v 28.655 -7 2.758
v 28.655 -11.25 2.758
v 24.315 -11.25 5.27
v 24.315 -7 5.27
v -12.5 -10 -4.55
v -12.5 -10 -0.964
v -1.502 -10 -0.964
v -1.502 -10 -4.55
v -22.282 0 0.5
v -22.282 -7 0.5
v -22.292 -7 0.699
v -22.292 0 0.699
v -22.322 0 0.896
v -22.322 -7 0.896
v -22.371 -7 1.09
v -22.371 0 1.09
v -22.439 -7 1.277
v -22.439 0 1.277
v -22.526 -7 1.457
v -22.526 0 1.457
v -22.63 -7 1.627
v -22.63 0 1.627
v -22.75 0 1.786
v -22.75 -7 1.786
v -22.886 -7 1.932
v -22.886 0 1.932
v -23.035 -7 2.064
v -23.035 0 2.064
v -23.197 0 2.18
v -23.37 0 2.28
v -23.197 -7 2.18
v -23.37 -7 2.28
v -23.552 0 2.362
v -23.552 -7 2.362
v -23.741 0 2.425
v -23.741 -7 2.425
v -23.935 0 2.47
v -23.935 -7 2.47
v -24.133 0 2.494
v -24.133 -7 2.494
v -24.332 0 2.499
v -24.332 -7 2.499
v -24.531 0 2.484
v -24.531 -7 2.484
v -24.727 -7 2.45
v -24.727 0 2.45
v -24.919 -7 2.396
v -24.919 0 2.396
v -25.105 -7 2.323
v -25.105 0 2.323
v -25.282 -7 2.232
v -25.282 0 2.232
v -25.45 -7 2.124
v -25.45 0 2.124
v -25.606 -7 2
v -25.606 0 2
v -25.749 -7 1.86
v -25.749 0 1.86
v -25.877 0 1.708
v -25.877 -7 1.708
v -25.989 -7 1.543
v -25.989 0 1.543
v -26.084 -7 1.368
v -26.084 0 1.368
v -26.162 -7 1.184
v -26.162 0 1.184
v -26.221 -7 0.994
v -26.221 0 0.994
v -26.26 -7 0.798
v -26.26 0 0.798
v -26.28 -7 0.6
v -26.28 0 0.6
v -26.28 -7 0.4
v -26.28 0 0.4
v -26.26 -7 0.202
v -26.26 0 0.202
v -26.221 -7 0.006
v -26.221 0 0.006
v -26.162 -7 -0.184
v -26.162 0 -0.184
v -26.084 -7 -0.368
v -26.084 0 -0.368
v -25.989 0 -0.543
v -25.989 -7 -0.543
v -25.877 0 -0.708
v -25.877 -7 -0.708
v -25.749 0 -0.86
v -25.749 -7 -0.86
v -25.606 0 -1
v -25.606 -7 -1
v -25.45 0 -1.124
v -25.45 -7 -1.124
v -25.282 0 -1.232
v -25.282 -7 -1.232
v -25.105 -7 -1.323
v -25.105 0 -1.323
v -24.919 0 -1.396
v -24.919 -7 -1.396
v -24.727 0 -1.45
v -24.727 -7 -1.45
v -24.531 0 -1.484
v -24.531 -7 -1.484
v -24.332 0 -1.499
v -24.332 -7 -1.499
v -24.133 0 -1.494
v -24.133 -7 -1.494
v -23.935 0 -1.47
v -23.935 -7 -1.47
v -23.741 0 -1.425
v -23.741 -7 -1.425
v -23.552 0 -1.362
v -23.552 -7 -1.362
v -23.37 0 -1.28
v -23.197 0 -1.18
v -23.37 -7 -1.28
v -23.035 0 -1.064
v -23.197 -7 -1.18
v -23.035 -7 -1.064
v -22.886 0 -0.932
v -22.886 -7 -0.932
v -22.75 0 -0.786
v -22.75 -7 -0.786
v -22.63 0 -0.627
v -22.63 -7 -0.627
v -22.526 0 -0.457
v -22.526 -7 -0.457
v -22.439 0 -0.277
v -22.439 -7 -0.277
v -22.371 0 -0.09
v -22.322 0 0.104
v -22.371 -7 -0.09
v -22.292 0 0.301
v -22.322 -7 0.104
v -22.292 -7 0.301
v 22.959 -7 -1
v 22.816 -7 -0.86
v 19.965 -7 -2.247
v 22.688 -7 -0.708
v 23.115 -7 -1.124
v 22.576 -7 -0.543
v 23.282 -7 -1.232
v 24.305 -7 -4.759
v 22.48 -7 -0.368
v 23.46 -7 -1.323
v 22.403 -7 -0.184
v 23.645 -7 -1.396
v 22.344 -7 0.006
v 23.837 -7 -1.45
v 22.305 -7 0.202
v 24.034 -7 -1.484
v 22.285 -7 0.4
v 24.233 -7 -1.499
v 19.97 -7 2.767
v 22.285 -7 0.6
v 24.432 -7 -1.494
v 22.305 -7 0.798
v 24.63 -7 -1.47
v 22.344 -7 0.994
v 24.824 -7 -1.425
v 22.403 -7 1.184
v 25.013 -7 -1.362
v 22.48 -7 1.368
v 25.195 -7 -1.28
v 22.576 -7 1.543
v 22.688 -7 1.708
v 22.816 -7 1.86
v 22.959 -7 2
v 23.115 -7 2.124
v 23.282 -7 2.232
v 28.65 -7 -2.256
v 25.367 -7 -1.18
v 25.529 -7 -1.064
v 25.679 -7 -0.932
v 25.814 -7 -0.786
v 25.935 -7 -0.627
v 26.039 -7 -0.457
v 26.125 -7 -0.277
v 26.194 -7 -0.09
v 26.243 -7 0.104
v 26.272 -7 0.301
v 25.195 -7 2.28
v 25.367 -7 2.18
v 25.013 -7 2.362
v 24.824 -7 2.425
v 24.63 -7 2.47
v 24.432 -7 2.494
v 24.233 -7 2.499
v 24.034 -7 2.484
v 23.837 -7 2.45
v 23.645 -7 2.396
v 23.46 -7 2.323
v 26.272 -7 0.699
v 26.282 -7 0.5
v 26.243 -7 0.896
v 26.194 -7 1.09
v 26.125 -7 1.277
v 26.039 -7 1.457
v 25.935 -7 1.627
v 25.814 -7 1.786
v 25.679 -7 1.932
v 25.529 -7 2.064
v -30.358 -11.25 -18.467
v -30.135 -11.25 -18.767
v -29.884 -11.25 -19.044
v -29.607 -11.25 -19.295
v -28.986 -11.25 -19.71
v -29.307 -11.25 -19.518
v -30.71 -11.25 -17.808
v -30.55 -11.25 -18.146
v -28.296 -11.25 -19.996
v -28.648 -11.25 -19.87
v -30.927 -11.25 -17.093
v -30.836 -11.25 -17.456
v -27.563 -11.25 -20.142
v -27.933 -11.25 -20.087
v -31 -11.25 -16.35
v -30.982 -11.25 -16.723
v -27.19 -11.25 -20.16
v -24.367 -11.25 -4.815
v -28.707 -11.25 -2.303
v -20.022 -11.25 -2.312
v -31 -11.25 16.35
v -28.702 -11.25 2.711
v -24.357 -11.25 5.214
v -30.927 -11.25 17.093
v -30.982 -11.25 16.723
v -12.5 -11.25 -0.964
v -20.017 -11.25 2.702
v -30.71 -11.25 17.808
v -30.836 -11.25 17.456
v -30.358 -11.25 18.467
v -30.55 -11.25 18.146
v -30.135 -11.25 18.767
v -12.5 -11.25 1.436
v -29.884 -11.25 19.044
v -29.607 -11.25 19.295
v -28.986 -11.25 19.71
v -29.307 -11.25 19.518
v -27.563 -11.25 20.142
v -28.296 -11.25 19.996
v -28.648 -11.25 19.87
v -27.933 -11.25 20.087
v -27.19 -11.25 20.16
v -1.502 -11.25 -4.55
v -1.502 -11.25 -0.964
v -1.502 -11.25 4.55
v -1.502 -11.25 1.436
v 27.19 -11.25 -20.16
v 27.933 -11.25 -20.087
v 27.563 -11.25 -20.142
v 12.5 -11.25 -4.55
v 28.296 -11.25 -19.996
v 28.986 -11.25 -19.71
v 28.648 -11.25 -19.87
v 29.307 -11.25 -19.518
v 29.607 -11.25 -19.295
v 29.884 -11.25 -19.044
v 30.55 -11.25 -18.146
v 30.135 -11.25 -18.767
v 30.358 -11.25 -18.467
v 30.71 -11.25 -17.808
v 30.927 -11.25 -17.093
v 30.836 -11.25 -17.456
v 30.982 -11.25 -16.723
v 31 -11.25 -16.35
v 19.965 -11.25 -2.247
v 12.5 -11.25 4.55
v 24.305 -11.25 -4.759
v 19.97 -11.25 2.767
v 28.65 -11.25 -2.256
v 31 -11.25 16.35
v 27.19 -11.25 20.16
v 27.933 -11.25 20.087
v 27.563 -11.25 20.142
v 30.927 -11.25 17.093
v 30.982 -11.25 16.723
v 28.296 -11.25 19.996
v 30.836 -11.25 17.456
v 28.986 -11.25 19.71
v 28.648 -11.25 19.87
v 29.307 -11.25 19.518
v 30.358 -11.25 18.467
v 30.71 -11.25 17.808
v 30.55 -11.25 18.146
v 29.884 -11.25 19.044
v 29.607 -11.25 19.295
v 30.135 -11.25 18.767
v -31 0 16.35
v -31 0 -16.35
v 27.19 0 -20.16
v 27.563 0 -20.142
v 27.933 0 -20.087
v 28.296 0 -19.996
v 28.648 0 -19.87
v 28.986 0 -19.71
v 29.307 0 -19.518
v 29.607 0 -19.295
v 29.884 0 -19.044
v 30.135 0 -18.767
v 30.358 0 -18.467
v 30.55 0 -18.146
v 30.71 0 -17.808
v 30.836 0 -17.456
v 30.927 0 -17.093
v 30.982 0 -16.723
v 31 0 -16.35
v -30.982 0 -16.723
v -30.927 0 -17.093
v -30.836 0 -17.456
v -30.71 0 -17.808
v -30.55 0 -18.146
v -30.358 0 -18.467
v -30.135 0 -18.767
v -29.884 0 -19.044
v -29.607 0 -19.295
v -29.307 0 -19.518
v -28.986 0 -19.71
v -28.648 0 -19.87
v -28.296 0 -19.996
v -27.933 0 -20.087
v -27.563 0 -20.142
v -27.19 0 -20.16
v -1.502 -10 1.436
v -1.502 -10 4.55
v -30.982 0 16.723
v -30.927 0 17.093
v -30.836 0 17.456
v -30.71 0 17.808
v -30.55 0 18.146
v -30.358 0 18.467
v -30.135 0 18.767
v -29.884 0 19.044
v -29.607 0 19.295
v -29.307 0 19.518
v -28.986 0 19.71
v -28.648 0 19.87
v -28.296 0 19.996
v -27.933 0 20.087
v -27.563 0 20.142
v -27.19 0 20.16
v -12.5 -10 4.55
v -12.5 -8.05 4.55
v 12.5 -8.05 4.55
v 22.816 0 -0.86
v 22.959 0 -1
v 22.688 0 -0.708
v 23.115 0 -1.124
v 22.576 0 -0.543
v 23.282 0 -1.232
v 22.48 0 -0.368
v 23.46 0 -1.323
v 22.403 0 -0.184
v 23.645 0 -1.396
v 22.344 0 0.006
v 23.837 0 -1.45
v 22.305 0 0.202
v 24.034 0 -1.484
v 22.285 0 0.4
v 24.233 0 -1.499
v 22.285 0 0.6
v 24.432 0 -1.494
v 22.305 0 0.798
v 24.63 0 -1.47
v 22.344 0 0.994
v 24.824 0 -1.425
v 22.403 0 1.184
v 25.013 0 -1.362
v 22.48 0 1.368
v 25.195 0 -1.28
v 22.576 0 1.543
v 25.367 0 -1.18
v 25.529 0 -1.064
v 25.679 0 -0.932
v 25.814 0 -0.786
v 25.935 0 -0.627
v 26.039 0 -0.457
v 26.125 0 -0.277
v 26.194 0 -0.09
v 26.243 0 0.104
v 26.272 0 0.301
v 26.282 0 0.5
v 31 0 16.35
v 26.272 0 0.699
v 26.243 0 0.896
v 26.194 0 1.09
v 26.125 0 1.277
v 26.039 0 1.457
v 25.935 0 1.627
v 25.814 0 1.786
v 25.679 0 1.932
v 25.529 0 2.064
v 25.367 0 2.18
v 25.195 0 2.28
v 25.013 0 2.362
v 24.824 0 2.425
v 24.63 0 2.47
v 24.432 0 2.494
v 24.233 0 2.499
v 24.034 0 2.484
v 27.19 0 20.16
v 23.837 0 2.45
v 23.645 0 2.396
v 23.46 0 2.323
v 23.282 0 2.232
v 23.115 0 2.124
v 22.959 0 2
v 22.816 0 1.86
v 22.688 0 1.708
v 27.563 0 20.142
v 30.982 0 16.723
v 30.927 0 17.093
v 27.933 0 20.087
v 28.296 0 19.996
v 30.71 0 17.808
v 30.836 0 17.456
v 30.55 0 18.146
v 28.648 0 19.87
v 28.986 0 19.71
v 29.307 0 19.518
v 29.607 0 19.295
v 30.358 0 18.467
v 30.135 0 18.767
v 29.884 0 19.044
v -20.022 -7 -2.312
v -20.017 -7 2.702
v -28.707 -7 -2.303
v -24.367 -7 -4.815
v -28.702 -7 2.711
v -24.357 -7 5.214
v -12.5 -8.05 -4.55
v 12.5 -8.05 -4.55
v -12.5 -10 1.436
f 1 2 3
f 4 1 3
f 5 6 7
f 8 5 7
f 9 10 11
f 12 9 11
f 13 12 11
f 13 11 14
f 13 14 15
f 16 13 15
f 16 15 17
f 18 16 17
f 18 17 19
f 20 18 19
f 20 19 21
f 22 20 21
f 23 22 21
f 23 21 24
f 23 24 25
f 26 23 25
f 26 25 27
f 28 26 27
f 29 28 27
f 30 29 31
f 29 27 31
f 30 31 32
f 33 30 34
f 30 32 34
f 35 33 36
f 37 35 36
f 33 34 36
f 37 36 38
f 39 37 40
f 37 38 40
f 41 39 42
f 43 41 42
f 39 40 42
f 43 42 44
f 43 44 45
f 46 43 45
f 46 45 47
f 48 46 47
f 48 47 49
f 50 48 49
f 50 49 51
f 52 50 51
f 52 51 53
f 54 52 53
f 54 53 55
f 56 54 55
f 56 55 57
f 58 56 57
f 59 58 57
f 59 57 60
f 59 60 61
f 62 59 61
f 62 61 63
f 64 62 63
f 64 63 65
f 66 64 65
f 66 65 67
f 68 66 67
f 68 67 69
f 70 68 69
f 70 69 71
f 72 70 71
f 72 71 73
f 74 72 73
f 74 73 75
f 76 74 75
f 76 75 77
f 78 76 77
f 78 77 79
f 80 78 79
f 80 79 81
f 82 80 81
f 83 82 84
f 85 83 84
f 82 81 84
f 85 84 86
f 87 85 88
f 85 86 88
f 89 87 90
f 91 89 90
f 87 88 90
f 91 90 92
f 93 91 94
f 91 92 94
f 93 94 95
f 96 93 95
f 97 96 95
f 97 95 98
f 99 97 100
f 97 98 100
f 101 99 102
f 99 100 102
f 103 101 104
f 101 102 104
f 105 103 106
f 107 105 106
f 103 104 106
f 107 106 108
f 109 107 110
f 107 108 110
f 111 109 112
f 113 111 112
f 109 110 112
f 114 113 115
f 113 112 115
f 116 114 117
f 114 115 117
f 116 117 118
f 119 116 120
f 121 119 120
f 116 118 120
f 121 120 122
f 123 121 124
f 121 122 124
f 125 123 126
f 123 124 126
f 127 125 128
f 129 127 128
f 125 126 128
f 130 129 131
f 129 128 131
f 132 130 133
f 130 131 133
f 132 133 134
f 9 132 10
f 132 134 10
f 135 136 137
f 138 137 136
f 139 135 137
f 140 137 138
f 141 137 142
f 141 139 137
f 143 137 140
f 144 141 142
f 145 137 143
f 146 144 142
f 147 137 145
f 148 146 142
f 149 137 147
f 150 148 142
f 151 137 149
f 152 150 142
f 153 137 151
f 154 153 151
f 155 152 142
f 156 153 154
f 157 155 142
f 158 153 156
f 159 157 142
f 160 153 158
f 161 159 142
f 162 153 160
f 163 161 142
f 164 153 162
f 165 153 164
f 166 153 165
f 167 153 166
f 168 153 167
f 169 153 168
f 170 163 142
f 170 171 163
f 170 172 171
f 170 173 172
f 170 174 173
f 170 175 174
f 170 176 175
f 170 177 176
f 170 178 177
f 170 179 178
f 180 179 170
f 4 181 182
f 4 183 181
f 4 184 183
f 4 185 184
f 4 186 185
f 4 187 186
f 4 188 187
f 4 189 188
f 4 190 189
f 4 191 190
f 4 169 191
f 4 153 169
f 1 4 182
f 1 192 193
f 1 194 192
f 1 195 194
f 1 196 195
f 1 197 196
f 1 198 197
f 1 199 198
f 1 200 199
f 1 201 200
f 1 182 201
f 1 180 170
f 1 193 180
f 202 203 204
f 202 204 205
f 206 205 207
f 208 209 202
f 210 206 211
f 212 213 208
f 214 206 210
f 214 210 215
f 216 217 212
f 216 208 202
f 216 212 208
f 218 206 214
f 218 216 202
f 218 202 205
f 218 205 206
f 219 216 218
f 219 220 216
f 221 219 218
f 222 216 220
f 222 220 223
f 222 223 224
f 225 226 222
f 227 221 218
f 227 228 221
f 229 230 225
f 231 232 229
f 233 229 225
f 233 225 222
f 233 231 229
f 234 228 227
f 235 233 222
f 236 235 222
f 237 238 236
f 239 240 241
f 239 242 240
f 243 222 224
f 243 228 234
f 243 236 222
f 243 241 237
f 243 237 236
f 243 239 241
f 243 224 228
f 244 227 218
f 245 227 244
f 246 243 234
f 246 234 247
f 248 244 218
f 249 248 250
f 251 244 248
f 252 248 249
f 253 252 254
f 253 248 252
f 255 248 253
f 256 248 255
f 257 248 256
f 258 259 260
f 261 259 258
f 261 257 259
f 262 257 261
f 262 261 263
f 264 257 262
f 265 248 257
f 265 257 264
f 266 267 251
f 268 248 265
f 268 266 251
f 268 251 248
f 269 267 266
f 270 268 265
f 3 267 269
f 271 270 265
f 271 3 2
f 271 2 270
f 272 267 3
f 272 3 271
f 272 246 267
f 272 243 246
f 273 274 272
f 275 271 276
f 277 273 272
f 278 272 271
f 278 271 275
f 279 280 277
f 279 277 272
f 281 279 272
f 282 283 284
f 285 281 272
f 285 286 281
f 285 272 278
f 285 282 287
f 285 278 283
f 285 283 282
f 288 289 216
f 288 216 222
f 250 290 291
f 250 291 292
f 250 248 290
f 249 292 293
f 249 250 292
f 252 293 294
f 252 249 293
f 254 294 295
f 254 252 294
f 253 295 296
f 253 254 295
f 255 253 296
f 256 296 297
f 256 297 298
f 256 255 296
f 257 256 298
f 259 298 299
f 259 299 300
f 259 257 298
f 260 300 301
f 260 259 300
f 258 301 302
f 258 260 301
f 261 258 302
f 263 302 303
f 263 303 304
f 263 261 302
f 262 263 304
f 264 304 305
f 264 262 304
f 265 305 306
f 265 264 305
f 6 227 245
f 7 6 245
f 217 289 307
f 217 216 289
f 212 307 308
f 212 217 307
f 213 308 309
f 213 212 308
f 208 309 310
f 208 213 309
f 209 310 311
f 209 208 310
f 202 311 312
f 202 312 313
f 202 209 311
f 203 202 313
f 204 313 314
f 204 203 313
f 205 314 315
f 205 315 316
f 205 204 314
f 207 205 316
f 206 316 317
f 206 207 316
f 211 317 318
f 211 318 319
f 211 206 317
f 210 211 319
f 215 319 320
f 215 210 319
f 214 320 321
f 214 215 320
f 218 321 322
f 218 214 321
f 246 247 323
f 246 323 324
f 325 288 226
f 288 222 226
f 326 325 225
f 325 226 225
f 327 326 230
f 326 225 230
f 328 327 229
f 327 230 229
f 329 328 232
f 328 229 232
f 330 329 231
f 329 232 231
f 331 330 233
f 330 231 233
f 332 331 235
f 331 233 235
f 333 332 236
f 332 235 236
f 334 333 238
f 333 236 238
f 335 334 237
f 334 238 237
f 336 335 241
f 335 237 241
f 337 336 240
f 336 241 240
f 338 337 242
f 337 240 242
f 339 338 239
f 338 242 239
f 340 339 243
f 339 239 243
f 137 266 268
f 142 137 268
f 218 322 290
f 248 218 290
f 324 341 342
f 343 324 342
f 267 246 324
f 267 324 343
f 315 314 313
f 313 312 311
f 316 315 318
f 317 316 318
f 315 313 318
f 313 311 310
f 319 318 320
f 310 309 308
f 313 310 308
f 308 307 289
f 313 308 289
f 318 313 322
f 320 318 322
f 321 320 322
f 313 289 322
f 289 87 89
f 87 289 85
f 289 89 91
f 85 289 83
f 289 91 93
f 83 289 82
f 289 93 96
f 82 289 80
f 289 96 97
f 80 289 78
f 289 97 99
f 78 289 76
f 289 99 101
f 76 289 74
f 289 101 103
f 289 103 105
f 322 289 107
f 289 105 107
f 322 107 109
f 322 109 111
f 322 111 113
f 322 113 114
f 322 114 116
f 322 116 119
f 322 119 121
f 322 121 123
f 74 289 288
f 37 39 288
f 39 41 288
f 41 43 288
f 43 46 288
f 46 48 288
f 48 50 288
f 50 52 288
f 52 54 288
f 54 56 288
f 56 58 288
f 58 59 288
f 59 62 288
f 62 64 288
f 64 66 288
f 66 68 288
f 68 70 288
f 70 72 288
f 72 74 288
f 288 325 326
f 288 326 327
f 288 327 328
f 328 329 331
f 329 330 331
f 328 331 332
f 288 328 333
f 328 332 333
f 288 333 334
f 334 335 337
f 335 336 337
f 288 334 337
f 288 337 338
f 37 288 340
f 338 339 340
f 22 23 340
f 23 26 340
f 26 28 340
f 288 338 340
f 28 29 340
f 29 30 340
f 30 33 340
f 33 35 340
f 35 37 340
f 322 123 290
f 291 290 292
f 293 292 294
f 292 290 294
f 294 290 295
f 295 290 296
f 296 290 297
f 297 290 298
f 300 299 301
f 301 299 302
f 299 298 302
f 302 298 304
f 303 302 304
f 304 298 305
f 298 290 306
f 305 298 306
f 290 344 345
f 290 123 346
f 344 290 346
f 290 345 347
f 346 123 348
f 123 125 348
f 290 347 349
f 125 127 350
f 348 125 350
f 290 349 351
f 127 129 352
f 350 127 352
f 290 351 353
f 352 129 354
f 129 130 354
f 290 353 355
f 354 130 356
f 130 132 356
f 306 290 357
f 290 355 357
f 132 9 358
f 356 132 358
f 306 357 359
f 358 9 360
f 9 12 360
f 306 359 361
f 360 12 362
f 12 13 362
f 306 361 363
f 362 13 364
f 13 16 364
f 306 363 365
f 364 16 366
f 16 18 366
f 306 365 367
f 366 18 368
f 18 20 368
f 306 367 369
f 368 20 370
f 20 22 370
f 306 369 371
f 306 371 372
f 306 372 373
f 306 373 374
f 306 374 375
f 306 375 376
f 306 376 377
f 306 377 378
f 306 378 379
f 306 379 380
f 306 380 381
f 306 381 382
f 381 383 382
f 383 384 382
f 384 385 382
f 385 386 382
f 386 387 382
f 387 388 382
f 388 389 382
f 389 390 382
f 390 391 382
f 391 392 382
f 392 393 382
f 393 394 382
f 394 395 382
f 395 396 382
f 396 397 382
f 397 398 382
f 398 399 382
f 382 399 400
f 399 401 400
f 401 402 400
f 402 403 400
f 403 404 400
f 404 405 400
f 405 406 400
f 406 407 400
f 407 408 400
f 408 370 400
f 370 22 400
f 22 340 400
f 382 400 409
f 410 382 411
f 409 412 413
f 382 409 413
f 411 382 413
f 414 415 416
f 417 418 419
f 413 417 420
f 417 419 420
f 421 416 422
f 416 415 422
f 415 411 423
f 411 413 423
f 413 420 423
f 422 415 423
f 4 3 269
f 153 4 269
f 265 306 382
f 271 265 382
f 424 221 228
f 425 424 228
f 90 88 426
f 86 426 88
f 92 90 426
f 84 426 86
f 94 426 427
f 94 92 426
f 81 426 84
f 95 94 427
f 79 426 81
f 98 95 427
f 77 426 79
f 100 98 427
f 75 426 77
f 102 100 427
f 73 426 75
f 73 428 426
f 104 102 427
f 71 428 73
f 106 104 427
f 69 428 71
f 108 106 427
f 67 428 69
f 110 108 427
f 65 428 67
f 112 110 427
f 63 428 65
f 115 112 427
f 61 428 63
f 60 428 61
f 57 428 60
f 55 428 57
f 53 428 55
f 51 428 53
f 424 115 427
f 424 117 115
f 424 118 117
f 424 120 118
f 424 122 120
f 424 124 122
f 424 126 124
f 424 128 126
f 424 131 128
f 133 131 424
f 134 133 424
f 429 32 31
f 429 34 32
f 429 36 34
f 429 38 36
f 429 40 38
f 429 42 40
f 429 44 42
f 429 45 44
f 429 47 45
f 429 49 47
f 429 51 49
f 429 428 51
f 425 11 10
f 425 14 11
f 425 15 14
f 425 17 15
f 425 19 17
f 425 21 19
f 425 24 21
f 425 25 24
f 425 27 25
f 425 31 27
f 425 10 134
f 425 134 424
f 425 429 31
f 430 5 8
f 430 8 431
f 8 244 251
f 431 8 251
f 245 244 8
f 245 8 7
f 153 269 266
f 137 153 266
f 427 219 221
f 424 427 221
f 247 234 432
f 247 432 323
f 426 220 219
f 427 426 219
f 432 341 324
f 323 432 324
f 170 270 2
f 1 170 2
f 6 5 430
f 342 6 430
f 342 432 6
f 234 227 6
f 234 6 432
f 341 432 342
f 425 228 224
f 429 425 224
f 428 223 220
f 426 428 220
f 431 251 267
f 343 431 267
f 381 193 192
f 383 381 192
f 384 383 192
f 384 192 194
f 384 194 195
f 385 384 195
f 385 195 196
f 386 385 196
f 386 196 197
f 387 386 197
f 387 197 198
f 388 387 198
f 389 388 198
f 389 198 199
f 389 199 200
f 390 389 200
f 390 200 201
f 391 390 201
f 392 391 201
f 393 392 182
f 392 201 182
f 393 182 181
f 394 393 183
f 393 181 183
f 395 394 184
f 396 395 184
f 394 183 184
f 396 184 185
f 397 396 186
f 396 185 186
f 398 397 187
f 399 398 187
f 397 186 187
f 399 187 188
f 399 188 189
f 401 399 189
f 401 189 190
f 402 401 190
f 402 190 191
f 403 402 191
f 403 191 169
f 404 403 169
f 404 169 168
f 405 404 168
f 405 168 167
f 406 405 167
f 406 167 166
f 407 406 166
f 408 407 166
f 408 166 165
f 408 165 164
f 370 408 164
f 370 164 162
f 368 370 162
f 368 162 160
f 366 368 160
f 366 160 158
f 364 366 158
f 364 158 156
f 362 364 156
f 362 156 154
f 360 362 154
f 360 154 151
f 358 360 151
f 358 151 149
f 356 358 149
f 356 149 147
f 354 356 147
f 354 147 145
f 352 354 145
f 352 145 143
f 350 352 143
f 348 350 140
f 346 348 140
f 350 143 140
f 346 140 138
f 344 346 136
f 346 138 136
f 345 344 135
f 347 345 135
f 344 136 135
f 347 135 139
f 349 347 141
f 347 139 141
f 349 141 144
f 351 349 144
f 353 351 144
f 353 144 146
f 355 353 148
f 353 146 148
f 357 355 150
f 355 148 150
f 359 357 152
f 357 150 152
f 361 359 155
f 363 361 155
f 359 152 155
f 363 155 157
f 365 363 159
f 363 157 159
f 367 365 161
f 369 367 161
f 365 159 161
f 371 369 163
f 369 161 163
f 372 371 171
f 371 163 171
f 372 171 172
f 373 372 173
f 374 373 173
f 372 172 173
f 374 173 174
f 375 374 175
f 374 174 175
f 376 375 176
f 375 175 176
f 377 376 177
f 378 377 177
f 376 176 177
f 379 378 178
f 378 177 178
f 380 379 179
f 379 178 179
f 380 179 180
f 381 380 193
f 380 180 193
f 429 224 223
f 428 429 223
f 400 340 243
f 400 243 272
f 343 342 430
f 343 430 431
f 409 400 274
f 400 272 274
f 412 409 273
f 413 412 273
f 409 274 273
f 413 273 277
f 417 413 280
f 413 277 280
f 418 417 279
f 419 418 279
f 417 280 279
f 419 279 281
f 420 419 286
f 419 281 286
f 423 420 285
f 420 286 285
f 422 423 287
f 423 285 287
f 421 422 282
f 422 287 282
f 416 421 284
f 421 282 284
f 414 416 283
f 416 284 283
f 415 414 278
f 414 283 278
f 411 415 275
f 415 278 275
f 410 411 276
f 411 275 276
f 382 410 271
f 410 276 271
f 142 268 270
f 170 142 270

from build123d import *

# Parameters (mm, degrees)
F0_W      = 62
F0_H      = 40.32
F1_DEPTH  = 11.25
F2_W      = 25
F2_H      = 9.1
F3_DEPTH  = 3.2
F4_W      = 10.9982
F4_H      = 3.1144623497
F4_H_2    = 3.5855376503
F5_DEPTH  = 1.25
F6_R      = 3.81
F7_R      = 2
F8_DEPTH  = 15.24
F10_DEPTH = 4.25


with BuildPart() as f1:
    # F0 (on Front) → F1 (new body)
    with BuildSketch(Plane.XZ):
        Rectangle(F0_W, F0_H)
    extrude(amount=F1_DEPTH)

    # F2 (on face) → F3 (cut)
    with BuildSketch(Plane.XZ.offset(11.25)):
        Rectangle(F2_W, F2_H)
    extrude(amount=-F3_DEPTH, mode=Mode.SUBTRACT)

    # F4 (on face) → F5 (join)
    with BuildSketch(Plane.XZ.offset(11.25)):
        with Locations((-7.0009, 2.9927688252)):
            Rectangle(F4_W, F4_H)
        with Locations((-7.0009, -2.7572311748)):
            Rectangle(F4_W, F4_H_2)
    extrude(amount=-F5_DEPTH)

    # F6
    f6_edges = [f1.edges().sort_by_distance(p)[0] for p in [
        (-31, -5.625, 20.16),
        (31, -5.625, 20.16),
        (31, -5.625, -20.16),
        (-31, -5.625, -20.16),
    ]]
    fillet(f6_edges, radius=F6_R)

    # F7 (on face) → F8 (cut)
    with BuildSketch(Plane.XZ.offset(11.25)):
        with Locations((-24.2824, 0.5)):
            Circle(F7_R)
        with Locations((24.2824, 0.5)):
            Circle(F7_R)
    extrude(amount=-F8_DEPTH, mode=Mode.SUBTRACT)

    # F9 (on face) → F10 (cut)
    with BuildSketch(Plane.XZ.offset(11.25)):
        Polygon((-24.3669678343, -4.8146678066), (-20.021959685, -2.3119505341), (-20.0168723469, 2.7022955391), (-24.356793158, 5.2138243397), (-28.7018013073, 2.7111070672), (-28.7068886454, -2.3031390059), align=None)
        Polygon((24.3045226557, -4.7588889519), (28.6495308049, -2.2561716794), (28.654618143, 2.7580743938), (24.3146973319, 5.2696031944), (19.9696891827, 2.7668859219), (19.9646018445, -2.2473601513), align=None)
    extrude(amount=-F10_DEPTH, mode=Mode.SUBTRACT)


solid = f1.part
